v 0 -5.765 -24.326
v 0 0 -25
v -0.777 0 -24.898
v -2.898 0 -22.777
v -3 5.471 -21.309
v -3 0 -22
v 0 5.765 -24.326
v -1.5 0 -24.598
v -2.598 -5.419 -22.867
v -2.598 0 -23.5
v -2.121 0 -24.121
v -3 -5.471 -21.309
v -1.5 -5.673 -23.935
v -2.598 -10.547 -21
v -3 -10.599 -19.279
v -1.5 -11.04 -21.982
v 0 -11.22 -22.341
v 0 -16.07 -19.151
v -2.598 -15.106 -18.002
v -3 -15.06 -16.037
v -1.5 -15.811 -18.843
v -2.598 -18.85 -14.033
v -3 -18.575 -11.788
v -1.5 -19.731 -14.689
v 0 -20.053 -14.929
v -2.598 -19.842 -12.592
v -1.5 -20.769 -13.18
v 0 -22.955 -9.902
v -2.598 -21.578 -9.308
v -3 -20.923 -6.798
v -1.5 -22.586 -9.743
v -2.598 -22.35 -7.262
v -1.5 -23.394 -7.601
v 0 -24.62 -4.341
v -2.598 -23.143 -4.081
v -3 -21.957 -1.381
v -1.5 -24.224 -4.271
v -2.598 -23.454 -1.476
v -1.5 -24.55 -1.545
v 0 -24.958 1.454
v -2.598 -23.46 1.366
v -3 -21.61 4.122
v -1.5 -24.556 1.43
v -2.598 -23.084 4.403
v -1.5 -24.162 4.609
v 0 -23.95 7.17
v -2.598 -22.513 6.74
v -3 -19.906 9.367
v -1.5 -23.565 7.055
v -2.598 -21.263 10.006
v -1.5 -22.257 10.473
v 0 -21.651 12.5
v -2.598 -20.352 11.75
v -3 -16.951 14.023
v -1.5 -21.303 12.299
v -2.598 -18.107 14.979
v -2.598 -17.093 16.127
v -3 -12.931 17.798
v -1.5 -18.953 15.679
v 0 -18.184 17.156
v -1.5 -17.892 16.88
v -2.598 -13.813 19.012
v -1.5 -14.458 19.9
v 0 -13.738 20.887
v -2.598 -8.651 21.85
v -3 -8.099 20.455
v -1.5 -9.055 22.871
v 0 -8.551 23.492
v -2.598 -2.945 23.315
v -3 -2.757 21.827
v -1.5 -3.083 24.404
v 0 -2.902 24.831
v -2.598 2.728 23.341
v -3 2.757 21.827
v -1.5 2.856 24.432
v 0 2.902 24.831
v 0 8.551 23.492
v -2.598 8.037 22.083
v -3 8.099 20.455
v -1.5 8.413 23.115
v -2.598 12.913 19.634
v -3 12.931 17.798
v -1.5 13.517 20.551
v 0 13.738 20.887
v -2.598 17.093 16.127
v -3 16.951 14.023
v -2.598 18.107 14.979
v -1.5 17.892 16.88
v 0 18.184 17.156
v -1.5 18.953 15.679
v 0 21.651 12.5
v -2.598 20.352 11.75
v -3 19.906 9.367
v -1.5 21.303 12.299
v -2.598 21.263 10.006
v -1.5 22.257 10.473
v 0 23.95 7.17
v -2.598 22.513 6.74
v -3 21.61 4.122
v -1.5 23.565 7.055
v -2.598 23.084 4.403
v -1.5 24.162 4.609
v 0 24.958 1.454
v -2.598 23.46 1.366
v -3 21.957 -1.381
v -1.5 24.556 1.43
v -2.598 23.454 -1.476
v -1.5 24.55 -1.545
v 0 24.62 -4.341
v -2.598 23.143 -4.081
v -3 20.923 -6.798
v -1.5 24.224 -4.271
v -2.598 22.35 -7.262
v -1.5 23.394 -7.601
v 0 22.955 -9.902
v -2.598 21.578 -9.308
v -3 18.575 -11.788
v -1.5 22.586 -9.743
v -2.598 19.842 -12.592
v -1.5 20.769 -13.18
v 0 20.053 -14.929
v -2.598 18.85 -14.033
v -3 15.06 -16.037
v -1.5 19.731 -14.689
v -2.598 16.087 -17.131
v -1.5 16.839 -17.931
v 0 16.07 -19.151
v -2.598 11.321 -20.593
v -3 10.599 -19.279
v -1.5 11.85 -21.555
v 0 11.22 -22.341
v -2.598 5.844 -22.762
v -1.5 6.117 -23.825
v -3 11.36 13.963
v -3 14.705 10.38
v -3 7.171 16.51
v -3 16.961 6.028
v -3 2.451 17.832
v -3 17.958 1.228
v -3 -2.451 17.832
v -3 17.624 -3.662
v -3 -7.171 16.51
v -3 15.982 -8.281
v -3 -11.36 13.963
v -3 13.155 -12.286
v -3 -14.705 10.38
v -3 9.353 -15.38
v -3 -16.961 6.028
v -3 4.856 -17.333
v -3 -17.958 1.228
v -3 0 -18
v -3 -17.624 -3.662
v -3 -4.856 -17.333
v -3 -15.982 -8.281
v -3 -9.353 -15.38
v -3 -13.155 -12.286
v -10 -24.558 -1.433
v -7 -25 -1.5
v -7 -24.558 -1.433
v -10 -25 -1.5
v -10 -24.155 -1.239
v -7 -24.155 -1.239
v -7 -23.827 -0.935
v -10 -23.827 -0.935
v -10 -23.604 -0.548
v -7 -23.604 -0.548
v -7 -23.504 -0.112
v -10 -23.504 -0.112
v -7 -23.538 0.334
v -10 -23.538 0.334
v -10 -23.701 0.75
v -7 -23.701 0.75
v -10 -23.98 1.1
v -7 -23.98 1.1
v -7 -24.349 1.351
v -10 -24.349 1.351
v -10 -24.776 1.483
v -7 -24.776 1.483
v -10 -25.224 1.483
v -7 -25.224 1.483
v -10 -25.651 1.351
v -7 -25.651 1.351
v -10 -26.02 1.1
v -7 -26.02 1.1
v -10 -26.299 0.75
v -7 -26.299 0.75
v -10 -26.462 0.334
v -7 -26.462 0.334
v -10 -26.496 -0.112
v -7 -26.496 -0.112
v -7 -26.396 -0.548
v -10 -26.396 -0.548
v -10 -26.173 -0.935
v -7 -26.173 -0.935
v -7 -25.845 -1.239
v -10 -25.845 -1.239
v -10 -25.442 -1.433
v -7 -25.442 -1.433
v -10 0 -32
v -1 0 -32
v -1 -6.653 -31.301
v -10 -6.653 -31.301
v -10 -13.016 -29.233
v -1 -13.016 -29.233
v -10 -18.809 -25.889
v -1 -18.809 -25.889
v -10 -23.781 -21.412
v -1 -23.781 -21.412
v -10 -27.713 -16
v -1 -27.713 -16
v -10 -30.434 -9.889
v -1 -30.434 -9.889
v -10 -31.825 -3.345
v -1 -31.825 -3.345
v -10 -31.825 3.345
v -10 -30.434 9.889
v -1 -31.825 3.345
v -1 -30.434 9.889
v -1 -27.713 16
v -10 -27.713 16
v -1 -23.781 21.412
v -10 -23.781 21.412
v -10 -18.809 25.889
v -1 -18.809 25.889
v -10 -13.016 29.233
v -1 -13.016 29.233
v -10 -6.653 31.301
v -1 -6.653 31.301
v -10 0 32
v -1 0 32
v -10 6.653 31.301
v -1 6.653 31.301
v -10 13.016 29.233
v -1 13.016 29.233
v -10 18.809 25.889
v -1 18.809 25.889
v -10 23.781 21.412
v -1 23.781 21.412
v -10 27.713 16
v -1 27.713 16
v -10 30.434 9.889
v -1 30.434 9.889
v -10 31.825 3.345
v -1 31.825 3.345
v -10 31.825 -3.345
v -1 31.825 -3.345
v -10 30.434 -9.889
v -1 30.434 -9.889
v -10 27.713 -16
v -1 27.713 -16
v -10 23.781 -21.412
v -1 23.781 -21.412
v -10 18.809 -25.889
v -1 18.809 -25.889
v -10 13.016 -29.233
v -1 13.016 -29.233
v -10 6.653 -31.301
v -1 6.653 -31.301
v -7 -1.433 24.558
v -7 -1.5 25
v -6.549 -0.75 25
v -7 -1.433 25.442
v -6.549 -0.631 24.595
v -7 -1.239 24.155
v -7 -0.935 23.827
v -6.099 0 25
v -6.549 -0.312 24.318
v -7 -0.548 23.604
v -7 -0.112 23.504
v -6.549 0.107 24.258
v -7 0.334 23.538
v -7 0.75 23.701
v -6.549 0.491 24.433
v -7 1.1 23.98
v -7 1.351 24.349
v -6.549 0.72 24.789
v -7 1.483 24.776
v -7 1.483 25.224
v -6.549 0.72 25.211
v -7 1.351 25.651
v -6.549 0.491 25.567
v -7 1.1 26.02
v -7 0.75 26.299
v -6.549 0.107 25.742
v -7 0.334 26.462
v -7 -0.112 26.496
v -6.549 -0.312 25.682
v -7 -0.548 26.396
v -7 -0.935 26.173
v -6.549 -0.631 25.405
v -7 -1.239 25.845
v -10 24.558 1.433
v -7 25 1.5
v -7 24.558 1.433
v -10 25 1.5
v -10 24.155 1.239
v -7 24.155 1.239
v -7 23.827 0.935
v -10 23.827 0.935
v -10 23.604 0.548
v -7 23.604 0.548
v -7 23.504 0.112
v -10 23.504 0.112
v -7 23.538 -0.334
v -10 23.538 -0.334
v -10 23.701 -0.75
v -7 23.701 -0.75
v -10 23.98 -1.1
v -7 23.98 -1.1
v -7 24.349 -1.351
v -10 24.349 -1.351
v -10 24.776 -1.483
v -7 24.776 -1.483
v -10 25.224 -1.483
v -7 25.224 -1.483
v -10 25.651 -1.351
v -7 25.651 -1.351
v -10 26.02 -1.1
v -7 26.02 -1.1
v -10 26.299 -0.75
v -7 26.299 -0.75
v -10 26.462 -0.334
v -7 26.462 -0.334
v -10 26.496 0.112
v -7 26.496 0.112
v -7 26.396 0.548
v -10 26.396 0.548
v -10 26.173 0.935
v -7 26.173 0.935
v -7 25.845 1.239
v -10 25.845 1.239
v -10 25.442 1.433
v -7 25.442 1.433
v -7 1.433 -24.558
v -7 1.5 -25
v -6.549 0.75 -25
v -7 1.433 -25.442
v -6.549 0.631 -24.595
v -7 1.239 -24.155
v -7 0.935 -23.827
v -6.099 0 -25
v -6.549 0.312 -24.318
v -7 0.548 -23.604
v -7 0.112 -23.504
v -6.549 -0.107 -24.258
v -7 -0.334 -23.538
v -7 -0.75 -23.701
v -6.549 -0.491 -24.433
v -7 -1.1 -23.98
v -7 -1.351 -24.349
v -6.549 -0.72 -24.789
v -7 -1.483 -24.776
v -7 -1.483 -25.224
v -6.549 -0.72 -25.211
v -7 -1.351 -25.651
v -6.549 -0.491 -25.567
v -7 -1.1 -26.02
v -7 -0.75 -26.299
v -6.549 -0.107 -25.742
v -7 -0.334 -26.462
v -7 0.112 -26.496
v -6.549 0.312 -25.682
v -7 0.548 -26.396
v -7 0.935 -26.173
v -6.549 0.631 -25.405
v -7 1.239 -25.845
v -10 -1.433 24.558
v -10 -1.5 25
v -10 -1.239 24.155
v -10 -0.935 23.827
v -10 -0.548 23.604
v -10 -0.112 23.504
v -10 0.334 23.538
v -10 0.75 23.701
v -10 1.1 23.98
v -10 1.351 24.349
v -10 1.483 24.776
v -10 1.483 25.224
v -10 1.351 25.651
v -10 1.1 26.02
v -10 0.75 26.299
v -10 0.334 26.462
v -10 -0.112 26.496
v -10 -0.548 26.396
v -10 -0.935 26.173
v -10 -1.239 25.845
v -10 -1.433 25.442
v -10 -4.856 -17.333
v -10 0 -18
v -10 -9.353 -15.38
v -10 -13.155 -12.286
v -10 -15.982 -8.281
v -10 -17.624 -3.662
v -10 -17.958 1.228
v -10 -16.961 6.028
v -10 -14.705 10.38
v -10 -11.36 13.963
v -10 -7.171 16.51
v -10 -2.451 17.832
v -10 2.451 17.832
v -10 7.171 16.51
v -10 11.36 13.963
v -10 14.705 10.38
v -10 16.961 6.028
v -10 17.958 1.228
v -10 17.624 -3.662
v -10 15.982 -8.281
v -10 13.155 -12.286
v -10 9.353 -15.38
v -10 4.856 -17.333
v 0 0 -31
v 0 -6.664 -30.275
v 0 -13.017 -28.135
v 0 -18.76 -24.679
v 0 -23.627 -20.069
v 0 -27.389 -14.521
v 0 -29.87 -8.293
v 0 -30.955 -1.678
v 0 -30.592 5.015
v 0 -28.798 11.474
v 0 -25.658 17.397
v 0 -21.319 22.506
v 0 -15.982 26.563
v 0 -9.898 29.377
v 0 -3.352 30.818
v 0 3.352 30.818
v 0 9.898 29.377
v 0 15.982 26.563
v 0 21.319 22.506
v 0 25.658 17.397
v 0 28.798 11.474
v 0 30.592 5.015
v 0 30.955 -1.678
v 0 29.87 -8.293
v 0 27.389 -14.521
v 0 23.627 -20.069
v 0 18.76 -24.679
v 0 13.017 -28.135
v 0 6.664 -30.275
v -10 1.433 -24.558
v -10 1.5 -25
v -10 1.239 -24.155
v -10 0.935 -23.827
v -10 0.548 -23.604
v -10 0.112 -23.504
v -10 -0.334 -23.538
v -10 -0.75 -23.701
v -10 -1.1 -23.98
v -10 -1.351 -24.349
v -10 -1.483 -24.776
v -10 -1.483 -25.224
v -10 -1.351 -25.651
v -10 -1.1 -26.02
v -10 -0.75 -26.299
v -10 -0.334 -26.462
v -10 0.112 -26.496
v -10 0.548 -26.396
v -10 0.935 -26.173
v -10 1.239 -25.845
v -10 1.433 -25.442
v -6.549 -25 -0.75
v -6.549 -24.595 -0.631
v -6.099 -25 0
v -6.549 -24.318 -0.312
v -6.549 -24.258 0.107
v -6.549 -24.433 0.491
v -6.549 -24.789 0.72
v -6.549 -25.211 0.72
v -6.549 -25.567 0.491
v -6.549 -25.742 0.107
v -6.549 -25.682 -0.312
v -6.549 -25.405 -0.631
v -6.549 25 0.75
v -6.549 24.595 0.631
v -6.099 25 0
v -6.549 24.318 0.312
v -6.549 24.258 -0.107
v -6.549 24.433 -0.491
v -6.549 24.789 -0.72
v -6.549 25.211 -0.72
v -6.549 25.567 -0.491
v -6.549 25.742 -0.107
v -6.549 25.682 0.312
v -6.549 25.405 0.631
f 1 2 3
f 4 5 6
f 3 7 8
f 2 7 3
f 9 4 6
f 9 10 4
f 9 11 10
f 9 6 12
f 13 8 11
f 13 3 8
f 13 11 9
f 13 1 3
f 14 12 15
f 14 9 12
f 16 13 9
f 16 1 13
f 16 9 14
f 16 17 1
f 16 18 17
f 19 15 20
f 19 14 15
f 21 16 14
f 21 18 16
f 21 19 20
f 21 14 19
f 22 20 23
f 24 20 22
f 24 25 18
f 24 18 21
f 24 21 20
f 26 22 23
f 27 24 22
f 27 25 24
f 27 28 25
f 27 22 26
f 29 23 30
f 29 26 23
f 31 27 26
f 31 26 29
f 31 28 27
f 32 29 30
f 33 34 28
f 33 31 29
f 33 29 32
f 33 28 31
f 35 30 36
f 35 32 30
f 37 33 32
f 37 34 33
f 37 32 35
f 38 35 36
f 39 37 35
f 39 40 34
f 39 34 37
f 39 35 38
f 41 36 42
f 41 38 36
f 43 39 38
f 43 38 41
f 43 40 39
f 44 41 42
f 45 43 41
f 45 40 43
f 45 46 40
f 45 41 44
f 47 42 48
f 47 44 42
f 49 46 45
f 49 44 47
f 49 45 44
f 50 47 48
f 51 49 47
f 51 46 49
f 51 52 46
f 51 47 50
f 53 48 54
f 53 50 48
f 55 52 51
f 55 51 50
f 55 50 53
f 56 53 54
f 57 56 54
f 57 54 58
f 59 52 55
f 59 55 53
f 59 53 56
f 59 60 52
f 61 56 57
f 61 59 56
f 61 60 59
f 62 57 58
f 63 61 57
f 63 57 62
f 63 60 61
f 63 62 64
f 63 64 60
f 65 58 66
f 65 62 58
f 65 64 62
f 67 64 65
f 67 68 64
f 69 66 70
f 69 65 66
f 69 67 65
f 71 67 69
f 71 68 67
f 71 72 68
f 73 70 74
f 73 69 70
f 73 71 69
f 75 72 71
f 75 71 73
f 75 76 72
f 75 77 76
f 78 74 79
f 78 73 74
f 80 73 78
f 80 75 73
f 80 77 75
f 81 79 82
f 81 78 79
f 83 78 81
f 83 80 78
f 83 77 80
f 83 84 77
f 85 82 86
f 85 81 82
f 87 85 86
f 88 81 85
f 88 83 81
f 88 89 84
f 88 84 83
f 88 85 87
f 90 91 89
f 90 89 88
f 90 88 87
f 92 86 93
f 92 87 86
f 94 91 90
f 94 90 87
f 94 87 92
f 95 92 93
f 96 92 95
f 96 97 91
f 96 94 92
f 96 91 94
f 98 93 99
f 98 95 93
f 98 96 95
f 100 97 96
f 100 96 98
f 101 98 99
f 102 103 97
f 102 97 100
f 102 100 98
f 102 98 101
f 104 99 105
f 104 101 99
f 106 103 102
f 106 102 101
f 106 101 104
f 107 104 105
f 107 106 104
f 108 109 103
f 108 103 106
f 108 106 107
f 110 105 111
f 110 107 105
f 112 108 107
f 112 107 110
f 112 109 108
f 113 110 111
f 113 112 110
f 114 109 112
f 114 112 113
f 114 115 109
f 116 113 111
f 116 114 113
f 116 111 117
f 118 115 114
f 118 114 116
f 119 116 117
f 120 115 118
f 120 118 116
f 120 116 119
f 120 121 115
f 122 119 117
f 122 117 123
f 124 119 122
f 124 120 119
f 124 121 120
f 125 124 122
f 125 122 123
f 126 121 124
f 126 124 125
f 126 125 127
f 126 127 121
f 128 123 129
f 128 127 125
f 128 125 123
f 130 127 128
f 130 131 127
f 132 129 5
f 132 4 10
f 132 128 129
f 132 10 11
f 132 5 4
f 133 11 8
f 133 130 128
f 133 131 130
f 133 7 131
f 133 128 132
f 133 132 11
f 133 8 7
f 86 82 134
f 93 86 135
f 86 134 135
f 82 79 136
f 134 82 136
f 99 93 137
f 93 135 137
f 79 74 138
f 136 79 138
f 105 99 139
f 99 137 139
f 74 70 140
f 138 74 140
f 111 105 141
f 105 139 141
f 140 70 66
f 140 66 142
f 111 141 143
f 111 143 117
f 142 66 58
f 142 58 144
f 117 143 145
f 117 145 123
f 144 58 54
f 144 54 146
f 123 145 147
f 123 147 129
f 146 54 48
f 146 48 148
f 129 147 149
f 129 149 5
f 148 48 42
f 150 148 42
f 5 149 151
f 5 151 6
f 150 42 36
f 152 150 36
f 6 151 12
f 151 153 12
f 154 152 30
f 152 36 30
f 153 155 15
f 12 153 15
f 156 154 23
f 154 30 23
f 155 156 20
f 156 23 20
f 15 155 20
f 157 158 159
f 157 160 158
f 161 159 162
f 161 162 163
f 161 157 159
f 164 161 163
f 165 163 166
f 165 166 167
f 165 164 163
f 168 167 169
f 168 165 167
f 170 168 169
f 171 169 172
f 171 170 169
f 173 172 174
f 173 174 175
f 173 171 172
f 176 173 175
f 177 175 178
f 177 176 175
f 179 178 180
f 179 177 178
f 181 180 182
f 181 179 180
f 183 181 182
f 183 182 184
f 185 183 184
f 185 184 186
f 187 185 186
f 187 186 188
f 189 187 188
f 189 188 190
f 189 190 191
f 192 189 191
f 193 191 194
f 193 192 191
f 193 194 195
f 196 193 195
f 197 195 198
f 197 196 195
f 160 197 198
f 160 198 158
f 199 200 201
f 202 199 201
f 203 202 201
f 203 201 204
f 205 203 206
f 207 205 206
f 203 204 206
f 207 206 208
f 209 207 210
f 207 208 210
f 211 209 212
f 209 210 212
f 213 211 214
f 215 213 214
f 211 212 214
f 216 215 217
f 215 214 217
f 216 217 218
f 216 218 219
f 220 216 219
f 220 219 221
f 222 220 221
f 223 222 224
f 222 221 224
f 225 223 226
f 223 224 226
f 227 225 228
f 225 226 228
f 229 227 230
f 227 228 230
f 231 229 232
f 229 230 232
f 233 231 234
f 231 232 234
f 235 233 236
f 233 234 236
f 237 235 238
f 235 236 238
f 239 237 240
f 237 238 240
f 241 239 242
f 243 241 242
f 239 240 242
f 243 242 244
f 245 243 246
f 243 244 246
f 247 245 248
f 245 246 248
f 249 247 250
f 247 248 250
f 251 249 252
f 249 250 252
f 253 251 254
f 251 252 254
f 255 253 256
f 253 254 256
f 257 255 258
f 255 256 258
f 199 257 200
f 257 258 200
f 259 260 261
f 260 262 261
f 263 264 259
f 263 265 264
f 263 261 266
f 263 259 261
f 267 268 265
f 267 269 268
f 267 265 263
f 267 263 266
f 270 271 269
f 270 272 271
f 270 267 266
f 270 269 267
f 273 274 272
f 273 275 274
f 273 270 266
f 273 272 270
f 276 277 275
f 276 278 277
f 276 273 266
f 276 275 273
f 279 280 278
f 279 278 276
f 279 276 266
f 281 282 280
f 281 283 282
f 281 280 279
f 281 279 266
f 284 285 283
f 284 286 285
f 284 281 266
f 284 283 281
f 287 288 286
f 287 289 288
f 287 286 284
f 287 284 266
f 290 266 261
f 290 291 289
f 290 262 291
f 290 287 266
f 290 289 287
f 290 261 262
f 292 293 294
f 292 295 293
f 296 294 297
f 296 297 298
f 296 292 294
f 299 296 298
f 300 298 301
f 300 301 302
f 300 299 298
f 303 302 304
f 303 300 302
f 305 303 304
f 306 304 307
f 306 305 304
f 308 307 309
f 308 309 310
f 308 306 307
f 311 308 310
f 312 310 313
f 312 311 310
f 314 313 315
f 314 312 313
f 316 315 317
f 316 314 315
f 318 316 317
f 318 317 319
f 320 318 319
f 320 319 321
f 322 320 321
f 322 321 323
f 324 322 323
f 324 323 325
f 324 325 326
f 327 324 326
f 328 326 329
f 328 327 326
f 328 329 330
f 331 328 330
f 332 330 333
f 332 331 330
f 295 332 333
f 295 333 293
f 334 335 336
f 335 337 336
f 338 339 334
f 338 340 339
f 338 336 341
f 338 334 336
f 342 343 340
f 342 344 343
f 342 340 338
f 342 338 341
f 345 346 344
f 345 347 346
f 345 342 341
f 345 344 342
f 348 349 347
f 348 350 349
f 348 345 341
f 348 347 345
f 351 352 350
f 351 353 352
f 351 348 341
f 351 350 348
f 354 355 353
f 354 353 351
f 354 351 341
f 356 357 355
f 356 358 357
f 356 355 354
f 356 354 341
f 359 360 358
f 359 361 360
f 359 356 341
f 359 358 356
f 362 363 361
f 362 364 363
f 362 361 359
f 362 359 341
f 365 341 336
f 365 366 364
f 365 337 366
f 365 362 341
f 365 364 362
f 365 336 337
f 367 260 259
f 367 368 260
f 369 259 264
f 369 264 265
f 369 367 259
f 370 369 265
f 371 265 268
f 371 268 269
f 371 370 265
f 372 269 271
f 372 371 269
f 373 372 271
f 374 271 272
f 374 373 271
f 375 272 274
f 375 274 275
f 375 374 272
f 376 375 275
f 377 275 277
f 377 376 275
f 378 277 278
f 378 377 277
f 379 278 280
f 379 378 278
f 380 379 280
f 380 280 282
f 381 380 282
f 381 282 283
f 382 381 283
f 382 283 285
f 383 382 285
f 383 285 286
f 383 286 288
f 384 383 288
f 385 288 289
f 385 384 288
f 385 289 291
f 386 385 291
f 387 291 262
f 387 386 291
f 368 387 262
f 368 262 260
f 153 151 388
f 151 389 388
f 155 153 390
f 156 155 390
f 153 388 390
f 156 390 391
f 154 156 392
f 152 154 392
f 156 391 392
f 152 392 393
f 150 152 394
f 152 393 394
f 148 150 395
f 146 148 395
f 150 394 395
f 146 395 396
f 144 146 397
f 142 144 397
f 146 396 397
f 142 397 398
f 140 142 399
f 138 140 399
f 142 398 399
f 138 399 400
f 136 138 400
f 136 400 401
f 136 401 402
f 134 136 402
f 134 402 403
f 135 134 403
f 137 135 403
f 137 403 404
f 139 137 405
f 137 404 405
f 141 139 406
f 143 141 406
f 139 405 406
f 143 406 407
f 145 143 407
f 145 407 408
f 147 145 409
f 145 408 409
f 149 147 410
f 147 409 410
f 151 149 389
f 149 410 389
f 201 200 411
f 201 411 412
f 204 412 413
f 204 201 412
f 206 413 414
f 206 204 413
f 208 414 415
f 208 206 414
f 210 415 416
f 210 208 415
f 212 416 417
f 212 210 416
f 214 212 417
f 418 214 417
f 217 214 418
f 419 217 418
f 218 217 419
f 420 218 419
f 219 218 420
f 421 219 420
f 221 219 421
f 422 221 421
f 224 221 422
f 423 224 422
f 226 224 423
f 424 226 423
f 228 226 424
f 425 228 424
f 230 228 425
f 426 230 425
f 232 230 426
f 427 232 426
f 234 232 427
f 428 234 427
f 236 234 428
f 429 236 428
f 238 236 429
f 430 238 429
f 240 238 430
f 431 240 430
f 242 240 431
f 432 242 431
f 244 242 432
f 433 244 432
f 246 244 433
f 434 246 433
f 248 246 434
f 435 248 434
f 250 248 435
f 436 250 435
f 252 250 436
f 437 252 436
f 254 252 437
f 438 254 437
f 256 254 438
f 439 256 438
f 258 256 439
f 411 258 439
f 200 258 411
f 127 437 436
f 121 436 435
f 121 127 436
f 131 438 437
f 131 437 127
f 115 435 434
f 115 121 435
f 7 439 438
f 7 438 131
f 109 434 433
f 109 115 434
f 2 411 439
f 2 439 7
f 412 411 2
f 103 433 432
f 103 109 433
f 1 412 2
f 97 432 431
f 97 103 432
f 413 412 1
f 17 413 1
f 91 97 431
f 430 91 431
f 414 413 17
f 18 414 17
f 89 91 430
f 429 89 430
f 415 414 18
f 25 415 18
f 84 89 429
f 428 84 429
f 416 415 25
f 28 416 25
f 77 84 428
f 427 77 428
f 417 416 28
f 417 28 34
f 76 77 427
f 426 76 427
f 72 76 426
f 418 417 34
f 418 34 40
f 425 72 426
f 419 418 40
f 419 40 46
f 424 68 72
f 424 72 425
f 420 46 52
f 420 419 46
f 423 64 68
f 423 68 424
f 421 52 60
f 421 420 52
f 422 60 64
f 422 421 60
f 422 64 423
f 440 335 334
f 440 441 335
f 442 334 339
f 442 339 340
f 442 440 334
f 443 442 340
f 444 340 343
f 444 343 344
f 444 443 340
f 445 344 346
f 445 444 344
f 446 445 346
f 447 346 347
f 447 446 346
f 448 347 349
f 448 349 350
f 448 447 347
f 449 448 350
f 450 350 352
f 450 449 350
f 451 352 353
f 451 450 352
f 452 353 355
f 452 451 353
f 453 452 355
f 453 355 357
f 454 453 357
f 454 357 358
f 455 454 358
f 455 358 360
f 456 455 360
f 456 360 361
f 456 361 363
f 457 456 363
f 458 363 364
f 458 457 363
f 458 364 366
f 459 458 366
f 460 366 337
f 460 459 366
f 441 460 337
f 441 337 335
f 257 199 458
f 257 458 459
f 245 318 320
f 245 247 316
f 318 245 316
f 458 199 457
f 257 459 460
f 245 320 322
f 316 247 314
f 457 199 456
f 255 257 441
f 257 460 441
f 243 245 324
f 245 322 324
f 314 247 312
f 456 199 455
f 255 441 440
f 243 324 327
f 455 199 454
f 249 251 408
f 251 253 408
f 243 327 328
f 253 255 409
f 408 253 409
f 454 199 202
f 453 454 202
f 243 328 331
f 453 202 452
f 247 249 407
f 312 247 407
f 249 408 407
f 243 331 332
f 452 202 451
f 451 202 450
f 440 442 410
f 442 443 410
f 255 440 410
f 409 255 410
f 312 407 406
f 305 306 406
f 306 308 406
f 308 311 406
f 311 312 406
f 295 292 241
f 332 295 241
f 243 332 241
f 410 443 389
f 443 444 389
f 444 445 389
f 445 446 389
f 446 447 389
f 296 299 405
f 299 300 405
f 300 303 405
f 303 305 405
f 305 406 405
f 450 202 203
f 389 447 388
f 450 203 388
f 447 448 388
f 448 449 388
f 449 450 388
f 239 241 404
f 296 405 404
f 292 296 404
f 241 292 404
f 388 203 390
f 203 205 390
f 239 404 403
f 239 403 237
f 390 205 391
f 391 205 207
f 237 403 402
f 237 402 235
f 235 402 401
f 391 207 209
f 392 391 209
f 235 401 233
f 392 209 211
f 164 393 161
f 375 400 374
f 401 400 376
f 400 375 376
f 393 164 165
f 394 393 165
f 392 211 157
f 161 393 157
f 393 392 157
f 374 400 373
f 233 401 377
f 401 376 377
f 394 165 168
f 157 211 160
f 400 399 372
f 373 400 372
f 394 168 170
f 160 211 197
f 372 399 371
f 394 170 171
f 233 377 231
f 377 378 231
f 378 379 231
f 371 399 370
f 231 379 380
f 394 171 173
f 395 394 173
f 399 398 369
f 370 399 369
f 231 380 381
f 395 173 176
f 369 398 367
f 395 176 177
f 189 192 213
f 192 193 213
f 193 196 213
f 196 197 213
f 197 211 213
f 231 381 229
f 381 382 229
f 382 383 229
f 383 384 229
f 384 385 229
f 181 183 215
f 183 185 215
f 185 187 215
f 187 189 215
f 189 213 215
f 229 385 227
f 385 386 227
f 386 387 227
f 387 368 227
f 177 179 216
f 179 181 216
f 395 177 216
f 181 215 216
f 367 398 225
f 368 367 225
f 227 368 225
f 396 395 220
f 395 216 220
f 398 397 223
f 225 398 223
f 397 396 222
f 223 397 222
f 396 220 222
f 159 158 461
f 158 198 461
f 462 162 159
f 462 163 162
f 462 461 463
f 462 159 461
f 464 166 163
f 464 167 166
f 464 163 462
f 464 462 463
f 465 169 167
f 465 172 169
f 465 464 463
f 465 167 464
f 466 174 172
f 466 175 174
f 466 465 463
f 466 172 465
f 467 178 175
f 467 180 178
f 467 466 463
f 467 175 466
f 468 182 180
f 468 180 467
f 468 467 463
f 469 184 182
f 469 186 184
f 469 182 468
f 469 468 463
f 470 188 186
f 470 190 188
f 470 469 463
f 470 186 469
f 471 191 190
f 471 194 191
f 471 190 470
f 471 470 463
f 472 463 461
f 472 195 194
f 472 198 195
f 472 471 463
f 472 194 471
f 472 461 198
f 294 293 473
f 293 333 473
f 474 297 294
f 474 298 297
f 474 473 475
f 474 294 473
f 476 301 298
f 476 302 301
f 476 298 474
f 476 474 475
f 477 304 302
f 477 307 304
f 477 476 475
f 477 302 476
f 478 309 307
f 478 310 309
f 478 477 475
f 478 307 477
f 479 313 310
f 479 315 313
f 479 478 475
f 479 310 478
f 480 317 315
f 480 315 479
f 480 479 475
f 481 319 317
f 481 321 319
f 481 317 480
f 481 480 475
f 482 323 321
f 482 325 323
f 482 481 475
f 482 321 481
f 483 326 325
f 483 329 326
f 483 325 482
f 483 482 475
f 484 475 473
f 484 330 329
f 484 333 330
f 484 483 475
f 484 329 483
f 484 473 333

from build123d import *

# Parameters (mm, degrees)
SKETCH1_W         = 10
SKETCH1_H         = 32
FILLET1_R         = 3
CIRPATTERN1_COUNT = 4
CHAMFER1_SIZE     = 1


with BuildPart() as part:
    # Sketch1 → Revolve1 (revolve)
    with BuildSketch(Plane.XY, mode=Mode.PRIVATE) as revolve1_sk:
        with Locations((-5, 16)):
            Rectangle(SKETCH1_W, SKETCH1_H)
    revolve(revolve1_sk.sketch.rotate(Axis((0, 0, 0), (-1, 0, 0)), 90), axis=Axis((0, 0, 0), (-1, 0, 0)))

    # Sketch2 → Cut-Revolve1 (revolve, cut)
    with BuildSketch(Plane.XY, mode=Mode.PRIVATE) as cut_revolve1_sk:
        Polygon((0, 0), (0, 25), (-3, 25), (-3, 18), (-10, 18), (-10, 0), align=None)
    revolve(cut_revolve1_sk.sketch.rotate(Axis((0, 0, 0), (-1, 0, 0)), 90), axis=Axis((0, 0, 0), (-1, 0, 0)), mode=Mode.SUBTRACT)

    # Fillet1
    fillet1_edges = [part.edges().sort_by_distance(p)[0] for p in [
        (-3, 0, 25),
    ]]
    fillet(fillet1_edges, radius=FILLET1_R - 0.0001)  # a hair under: the kernel refuses the full size

    # Sketch4 → Ø3.0mm Dowel Hole1 (revolve, cut)
    with BuildSketch(Plane(origin=(-10, 25, 0), x_dir=(0, 0, 1), z_dir=(0, 1, 0))):
        Polygon((0, 0), (0, 3.901290929), (1.5, 3), (1.5, 0), align=None)
    f_3_0mm_dowel_hole1 = revolve(axis=Axis((-16.35, 25, 0), (1, 0, 0)), mode=Mode.SUBTRACT)

    # CirPattern1: Ø3.0mm Dowel Hole1 ×4 about axis
    cirpattern1_axis = Axis((0, 0, 0), (1, 0, 0))
    for i in range(1, CIRPATTERN1_COUNT):
        add(f_3_0mm_dowel_hole1.rotate(cirpattern1_axis, i * 360 / CIRPATTERN1_COUNT), mode=Mode.SUBTRACT)

    # Chamfer1
    chamfer1_edges = [part.edges().sort_by_distance(p)[0] for p in [
        (0, 0, 32),
    ]]
    chamfer(chamfer1_edges, length=CHAMFER1_SIZE)


solid = part.part
